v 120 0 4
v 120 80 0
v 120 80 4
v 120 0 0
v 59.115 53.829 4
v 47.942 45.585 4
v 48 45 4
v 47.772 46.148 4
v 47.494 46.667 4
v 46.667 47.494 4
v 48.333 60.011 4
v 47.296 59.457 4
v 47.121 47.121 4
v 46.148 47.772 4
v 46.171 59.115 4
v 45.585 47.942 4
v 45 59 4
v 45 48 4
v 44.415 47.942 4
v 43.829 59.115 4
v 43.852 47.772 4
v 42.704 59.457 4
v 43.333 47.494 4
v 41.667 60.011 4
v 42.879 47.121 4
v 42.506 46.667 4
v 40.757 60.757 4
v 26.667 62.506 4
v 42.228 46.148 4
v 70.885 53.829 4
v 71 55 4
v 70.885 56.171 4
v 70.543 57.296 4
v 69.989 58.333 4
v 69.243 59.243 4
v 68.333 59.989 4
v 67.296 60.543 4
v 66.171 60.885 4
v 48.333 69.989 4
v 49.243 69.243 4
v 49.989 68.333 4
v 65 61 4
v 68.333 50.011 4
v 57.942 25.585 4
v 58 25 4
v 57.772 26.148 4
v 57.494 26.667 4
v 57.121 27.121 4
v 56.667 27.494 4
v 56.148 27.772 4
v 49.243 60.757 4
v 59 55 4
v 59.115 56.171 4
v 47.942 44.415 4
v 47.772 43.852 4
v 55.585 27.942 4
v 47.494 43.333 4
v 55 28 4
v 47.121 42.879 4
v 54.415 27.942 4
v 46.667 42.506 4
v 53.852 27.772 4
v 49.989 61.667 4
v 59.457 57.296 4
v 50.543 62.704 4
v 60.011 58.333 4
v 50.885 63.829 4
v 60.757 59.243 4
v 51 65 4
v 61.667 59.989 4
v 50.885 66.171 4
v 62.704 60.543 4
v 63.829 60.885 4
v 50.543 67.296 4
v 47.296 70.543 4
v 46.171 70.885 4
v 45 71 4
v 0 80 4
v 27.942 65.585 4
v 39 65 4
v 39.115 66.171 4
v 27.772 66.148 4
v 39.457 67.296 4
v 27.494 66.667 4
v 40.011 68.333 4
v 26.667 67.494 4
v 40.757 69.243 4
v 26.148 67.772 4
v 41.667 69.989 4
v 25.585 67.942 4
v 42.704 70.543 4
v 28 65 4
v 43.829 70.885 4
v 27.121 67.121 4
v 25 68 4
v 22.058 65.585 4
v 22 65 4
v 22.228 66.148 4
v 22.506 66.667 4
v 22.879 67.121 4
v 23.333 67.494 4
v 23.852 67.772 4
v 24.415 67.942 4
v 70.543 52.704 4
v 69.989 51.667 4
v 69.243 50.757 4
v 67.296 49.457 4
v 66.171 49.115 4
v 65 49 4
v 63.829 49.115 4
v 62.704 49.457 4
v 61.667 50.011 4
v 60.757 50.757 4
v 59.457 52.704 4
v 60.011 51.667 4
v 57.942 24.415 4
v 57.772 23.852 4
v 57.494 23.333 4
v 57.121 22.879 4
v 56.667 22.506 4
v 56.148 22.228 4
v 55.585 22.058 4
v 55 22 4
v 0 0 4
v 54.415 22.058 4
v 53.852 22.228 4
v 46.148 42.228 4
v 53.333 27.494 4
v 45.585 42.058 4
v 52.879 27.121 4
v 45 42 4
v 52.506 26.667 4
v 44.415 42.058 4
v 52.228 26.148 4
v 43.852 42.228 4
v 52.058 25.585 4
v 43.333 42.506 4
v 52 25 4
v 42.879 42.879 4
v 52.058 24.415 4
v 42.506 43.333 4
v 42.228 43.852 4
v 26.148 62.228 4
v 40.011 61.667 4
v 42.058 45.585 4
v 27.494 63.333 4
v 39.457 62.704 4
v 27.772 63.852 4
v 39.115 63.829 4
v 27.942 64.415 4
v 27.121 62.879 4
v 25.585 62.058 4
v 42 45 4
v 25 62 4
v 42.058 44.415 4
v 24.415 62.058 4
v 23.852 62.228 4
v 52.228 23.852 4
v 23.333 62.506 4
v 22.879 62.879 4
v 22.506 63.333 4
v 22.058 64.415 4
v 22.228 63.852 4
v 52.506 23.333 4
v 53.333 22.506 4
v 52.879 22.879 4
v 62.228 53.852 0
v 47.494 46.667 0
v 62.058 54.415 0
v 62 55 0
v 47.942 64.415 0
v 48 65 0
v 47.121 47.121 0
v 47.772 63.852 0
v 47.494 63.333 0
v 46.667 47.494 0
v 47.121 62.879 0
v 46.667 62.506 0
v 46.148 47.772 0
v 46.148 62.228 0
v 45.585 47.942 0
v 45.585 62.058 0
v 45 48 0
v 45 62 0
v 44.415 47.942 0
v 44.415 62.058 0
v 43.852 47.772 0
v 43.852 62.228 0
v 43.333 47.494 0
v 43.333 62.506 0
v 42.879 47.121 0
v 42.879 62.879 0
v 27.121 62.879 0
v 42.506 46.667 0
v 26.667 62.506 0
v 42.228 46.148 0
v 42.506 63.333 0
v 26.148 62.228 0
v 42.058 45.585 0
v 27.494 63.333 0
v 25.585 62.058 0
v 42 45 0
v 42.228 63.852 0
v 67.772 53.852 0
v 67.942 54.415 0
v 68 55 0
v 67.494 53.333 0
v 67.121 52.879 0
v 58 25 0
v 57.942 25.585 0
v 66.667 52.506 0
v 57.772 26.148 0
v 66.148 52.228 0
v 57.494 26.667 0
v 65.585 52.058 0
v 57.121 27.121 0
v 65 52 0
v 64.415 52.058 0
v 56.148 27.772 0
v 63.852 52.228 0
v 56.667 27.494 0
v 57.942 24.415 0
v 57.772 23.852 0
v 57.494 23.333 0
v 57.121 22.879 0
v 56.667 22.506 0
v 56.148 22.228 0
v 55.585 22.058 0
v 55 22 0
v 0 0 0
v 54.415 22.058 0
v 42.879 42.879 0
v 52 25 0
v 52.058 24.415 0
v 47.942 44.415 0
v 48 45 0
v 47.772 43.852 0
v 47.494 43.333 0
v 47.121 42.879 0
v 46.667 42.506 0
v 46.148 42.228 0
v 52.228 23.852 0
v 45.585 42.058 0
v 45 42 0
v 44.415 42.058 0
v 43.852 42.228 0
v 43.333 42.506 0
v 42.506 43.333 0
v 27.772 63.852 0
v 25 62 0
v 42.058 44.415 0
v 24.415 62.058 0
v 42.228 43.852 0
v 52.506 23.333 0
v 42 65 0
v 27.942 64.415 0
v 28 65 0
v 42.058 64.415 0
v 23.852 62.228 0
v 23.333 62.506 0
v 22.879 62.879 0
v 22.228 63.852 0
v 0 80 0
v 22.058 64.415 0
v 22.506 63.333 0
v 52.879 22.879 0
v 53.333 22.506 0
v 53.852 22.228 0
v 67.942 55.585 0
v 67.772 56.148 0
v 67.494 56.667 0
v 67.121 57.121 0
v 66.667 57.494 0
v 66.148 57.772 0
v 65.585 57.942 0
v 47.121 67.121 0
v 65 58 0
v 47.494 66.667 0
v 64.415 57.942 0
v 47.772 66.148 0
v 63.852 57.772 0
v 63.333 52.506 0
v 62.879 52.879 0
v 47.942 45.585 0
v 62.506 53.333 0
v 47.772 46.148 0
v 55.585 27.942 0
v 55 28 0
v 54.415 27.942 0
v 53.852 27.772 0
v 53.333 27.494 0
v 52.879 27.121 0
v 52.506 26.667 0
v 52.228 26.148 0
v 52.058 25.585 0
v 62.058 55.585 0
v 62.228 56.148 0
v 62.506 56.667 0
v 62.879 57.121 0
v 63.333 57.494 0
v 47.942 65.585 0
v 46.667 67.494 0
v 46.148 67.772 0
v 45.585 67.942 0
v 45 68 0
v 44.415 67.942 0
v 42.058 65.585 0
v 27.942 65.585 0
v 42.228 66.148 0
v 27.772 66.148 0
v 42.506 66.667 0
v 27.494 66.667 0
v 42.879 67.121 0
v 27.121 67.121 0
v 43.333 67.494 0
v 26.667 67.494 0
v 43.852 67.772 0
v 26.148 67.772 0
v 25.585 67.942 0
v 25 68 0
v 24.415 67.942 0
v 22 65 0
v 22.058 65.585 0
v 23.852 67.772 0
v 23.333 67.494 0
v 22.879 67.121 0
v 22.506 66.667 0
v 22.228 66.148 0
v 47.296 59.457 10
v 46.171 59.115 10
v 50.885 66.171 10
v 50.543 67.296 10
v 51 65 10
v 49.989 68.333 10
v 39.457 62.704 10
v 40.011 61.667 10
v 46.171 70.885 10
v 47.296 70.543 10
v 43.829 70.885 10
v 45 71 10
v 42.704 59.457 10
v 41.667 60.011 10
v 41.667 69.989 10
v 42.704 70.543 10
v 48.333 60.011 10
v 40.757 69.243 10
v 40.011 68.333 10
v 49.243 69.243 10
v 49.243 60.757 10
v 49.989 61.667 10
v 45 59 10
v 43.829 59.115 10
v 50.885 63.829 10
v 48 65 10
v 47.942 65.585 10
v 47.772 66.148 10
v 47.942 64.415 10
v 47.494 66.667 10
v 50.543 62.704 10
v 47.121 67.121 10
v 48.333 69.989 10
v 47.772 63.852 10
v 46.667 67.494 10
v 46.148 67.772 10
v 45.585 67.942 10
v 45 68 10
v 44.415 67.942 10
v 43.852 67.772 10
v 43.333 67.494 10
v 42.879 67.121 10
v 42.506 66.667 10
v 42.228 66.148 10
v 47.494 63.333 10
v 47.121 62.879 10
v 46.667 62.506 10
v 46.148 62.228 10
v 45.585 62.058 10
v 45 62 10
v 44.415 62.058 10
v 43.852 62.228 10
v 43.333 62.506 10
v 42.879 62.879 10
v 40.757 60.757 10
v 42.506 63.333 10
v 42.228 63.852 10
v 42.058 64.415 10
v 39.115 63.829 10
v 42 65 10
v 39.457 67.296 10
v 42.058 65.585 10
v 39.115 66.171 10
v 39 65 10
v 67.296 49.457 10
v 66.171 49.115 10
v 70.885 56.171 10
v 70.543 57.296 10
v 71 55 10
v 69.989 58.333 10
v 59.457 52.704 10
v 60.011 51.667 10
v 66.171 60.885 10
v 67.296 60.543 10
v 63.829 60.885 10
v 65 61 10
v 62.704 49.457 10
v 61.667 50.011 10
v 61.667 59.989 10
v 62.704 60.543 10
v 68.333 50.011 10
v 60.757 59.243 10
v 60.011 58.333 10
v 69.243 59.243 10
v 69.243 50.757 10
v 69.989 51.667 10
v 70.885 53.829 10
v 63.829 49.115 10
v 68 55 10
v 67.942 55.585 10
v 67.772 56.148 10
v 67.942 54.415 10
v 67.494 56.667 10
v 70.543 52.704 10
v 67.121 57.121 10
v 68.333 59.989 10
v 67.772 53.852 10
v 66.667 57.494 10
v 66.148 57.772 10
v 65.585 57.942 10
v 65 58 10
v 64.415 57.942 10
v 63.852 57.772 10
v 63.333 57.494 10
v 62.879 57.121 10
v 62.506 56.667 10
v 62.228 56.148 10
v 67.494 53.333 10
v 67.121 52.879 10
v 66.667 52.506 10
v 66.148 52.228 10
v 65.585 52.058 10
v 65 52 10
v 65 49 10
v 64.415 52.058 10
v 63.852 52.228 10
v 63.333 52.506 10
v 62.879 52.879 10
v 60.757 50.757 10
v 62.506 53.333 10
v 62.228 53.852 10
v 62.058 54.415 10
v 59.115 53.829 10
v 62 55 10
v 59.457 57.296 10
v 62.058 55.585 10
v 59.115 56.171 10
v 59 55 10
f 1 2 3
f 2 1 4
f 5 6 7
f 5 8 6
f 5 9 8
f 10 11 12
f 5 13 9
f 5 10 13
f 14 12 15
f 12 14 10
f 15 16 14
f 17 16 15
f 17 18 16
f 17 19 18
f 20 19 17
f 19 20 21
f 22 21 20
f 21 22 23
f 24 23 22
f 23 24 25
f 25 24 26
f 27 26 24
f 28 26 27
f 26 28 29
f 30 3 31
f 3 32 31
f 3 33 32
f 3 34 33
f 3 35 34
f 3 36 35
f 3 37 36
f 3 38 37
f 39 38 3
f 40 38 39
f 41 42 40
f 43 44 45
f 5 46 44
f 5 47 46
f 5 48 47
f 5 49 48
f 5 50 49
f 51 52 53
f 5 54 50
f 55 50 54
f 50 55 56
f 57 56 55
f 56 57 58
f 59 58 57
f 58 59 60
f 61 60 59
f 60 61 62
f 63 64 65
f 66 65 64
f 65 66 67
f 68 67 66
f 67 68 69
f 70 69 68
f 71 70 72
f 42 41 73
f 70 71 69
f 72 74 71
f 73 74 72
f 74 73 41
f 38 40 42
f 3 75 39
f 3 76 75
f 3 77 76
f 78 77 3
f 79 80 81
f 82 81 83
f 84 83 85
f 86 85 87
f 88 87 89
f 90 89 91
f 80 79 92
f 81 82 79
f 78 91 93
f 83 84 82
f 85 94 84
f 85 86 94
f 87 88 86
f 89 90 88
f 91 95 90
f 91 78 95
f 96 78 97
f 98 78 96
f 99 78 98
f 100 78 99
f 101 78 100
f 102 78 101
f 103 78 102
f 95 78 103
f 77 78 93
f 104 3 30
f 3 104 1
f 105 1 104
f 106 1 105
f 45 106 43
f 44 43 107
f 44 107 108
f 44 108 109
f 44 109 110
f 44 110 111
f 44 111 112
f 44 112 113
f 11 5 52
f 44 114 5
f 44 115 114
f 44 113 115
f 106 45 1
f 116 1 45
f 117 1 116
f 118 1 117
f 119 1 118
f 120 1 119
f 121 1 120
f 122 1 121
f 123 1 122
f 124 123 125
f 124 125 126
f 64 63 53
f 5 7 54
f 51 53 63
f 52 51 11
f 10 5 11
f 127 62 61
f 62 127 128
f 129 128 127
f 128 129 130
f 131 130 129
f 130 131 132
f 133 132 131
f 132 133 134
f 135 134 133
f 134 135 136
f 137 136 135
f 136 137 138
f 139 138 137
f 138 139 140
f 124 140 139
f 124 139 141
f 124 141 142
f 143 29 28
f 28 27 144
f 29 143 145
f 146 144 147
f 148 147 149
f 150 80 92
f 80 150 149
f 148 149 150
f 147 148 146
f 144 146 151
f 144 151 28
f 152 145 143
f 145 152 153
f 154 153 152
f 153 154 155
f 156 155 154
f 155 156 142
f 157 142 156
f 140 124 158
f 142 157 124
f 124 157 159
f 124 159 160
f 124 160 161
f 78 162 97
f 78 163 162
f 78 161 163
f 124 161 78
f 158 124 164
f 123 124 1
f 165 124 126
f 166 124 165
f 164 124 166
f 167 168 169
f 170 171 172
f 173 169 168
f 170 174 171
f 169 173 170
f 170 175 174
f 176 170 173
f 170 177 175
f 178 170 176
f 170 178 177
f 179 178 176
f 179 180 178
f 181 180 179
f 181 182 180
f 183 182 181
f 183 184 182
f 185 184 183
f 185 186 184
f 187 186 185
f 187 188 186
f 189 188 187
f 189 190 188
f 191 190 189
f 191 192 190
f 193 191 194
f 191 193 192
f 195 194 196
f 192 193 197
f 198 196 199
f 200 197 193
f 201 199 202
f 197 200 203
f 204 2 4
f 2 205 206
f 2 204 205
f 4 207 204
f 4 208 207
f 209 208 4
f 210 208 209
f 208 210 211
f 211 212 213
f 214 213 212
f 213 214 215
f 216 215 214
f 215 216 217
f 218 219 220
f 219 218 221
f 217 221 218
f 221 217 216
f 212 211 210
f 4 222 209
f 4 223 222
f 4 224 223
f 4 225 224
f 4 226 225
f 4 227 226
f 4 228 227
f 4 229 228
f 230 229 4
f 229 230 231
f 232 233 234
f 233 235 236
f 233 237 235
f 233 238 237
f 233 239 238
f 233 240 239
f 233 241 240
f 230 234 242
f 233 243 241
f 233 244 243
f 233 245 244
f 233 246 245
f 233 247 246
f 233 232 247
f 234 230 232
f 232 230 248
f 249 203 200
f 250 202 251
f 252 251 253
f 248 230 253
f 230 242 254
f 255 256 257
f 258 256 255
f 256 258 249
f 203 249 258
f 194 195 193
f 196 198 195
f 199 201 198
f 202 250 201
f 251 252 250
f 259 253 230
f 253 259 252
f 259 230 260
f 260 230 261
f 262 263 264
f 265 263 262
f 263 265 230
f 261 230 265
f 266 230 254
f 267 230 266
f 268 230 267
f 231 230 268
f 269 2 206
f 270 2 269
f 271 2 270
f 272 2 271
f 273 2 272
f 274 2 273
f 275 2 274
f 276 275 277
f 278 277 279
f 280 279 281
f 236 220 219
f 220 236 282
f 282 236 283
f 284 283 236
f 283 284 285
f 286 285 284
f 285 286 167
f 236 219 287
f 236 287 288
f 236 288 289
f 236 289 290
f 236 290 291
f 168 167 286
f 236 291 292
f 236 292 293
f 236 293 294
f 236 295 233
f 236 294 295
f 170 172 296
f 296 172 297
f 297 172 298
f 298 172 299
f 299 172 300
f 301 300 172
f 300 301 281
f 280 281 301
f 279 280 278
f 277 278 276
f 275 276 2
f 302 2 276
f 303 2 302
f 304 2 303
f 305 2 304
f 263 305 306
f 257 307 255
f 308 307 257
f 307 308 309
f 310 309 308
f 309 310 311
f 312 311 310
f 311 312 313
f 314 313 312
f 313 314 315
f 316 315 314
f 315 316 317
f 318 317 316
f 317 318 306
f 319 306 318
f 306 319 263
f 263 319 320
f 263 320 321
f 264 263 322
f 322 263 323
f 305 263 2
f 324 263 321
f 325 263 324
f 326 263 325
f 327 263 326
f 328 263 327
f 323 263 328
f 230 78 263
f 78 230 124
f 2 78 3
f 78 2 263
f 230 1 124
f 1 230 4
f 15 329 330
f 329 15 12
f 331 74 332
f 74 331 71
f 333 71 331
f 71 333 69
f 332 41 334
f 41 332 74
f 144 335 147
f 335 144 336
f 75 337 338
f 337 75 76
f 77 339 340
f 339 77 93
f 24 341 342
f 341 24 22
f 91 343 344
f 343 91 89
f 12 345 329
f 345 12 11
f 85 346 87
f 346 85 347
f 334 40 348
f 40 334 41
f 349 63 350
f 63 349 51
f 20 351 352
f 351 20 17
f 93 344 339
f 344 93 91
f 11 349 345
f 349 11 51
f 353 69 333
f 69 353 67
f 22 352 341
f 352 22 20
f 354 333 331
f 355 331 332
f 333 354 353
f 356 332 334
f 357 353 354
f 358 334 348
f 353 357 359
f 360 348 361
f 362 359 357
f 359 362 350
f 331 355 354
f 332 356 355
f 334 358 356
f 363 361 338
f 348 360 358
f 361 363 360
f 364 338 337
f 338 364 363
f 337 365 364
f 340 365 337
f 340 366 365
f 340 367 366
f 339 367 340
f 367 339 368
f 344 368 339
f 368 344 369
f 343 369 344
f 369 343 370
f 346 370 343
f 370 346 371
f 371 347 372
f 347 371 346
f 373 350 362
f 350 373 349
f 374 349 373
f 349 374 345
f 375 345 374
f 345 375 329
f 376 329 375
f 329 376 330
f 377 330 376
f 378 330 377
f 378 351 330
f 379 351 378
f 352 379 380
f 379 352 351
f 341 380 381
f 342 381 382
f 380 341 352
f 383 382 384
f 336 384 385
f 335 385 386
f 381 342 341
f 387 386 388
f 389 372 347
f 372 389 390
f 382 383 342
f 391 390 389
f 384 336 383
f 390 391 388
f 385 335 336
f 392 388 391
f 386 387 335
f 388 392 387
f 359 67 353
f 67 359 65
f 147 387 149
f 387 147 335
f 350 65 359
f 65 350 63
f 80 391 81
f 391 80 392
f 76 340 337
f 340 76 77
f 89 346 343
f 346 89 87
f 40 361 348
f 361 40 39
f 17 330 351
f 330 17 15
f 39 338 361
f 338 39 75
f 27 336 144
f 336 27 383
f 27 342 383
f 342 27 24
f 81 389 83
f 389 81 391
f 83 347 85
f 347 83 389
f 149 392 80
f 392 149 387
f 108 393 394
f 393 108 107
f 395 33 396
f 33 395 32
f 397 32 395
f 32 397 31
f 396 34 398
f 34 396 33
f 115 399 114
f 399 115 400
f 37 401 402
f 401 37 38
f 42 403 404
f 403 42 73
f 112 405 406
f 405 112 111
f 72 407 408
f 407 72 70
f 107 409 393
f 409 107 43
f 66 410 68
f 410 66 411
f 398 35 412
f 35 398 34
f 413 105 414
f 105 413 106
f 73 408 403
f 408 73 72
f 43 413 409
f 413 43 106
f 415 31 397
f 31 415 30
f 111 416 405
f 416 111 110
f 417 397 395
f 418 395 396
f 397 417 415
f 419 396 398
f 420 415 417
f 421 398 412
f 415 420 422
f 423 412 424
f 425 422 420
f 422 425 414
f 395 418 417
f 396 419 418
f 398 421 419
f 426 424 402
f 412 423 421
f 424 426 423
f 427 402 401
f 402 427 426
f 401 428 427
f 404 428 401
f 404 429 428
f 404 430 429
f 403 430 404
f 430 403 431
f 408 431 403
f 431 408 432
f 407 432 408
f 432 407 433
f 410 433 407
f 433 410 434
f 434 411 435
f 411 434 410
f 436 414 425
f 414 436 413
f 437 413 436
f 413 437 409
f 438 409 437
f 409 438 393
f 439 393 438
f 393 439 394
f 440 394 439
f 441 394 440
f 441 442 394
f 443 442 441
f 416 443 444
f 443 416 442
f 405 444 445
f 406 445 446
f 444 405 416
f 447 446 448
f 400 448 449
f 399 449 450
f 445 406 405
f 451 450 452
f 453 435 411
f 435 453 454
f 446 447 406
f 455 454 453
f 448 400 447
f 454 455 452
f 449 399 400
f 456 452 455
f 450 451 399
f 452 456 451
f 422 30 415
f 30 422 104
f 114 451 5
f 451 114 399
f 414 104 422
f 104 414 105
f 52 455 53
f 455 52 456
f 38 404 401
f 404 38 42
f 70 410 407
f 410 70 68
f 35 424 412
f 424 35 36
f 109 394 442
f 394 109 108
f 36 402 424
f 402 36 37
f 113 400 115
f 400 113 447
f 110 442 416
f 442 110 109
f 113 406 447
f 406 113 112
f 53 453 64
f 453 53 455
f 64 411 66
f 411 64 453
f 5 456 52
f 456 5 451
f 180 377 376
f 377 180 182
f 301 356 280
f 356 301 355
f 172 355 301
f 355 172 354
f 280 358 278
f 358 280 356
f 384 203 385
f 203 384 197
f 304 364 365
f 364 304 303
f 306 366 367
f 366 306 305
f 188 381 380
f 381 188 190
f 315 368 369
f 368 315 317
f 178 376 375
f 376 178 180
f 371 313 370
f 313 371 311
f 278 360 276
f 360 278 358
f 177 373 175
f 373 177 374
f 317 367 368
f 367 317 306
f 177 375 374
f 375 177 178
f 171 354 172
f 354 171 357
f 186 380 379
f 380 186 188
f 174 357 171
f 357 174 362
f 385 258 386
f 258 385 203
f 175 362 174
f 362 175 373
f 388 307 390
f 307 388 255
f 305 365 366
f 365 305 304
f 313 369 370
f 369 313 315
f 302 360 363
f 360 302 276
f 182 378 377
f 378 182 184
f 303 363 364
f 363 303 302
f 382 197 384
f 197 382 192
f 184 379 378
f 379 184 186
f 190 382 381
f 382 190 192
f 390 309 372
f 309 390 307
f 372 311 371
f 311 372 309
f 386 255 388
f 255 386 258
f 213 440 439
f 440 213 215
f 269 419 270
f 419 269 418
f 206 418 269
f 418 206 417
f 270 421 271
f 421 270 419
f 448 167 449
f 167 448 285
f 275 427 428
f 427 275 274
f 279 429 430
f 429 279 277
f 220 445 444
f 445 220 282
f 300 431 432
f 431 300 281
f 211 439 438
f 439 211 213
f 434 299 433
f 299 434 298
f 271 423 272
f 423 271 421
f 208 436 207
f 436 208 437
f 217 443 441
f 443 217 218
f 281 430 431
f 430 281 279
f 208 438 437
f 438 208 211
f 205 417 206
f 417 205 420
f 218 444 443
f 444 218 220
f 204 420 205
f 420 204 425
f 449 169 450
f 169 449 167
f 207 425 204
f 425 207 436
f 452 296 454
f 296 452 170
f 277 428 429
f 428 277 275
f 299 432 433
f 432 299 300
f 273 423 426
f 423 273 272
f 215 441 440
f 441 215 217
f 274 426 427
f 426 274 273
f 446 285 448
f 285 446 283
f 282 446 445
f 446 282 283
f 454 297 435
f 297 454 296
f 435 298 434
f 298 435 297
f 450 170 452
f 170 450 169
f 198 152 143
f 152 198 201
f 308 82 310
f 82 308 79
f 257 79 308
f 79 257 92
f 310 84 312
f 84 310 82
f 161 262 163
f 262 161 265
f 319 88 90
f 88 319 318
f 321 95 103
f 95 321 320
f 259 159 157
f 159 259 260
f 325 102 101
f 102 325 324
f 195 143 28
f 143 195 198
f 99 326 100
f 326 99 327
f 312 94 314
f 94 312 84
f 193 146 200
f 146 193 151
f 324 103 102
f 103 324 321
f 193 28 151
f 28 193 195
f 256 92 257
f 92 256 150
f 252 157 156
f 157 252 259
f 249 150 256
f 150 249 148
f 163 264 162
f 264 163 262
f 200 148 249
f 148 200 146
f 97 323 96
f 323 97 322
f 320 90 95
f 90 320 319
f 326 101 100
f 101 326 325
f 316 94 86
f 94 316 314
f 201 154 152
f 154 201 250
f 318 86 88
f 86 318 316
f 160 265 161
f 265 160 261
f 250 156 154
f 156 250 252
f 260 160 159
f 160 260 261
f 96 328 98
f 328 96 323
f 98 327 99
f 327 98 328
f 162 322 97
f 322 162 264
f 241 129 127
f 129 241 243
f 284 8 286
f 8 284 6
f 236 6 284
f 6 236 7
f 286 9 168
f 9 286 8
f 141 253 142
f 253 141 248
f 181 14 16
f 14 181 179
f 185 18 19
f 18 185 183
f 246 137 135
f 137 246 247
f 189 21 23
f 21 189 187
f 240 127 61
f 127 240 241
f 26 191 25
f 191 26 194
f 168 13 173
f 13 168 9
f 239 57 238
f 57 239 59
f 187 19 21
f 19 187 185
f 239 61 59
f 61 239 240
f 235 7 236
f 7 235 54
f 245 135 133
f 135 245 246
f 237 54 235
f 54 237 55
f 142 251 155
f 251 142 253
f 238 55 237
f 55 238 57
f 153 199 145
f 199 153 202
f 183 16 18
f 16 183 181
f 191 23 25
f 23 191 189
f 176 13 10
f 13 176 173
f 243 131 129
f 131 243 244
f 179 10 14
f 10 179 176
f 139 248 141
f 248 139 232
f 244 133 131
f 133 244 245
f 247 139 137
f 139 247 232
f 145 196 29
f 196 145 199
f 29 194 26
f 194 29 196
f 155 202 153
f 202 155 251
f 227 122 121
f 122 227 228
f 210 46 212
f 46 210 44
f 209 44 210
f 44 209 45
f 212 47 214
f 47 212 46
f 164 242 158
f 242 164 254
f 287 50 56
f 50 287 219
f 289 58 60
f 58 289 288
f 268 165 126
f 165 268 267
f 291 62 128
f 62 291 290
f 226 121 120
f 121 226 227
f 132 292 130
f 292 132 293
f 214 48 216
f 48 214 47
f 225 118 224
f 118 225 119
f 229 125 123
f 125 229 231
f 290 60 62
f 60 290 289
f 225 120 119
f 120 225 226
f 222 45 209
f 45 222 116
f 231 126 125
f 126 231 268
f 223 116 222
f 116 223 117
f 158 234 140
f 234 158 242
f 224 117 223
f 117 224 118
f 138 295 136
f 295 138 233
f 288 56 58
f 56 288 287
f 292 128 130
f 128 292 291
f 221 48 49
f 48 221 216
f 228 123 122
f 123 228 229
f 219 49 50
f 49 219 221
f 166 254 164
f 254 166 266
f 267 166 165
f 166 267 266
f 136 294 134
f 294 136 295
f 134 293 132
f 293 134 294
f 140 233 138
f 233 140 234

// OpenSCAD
$fn = 32;

// ----------------------------------------------------------------------
// Mixed field: bosses and holes at given coordinates
// ----------------------------------------------------------------------

// --- parameters (mm) ---
plate_l = 120;            // plate length, X
plate_w = 80;             // plate width, Y
plate_t = 4;              // plate thickness, Z
boss_d = 12;              // boss diameter
boss_h = 6;               // boss height above the plate
hole_d = 6;               // through hole diameter

total_h = plate_t + boss_h;  // overall height

difference() {
  union() {
    cube([plate_l, plate_w, plate_t]);
    translate([45, 65, plate_t]) cylinder(h = boss_h, d = boss_d);
    translate([65, 55, plate_t]) cylinder(h = boss_h, d = boss_d);
  }
  translate([45, 65, -1]) cylinder(h = total_h + 2, d = boss_d / 2);
  translate([65, 55, -1]) cylinder(h = total_h + 2, d = boss_d / 2);
  translate([25, 65, -1]) cylinder(h = plate_t + 2, d = hole_d);
  translate([45, 45, -1]) cylinder(h = plate_t + 2, d = hole_d);
  translate([55, 25, -1]) cylinder(h = plate_t + 2, d = hole_d);
}
